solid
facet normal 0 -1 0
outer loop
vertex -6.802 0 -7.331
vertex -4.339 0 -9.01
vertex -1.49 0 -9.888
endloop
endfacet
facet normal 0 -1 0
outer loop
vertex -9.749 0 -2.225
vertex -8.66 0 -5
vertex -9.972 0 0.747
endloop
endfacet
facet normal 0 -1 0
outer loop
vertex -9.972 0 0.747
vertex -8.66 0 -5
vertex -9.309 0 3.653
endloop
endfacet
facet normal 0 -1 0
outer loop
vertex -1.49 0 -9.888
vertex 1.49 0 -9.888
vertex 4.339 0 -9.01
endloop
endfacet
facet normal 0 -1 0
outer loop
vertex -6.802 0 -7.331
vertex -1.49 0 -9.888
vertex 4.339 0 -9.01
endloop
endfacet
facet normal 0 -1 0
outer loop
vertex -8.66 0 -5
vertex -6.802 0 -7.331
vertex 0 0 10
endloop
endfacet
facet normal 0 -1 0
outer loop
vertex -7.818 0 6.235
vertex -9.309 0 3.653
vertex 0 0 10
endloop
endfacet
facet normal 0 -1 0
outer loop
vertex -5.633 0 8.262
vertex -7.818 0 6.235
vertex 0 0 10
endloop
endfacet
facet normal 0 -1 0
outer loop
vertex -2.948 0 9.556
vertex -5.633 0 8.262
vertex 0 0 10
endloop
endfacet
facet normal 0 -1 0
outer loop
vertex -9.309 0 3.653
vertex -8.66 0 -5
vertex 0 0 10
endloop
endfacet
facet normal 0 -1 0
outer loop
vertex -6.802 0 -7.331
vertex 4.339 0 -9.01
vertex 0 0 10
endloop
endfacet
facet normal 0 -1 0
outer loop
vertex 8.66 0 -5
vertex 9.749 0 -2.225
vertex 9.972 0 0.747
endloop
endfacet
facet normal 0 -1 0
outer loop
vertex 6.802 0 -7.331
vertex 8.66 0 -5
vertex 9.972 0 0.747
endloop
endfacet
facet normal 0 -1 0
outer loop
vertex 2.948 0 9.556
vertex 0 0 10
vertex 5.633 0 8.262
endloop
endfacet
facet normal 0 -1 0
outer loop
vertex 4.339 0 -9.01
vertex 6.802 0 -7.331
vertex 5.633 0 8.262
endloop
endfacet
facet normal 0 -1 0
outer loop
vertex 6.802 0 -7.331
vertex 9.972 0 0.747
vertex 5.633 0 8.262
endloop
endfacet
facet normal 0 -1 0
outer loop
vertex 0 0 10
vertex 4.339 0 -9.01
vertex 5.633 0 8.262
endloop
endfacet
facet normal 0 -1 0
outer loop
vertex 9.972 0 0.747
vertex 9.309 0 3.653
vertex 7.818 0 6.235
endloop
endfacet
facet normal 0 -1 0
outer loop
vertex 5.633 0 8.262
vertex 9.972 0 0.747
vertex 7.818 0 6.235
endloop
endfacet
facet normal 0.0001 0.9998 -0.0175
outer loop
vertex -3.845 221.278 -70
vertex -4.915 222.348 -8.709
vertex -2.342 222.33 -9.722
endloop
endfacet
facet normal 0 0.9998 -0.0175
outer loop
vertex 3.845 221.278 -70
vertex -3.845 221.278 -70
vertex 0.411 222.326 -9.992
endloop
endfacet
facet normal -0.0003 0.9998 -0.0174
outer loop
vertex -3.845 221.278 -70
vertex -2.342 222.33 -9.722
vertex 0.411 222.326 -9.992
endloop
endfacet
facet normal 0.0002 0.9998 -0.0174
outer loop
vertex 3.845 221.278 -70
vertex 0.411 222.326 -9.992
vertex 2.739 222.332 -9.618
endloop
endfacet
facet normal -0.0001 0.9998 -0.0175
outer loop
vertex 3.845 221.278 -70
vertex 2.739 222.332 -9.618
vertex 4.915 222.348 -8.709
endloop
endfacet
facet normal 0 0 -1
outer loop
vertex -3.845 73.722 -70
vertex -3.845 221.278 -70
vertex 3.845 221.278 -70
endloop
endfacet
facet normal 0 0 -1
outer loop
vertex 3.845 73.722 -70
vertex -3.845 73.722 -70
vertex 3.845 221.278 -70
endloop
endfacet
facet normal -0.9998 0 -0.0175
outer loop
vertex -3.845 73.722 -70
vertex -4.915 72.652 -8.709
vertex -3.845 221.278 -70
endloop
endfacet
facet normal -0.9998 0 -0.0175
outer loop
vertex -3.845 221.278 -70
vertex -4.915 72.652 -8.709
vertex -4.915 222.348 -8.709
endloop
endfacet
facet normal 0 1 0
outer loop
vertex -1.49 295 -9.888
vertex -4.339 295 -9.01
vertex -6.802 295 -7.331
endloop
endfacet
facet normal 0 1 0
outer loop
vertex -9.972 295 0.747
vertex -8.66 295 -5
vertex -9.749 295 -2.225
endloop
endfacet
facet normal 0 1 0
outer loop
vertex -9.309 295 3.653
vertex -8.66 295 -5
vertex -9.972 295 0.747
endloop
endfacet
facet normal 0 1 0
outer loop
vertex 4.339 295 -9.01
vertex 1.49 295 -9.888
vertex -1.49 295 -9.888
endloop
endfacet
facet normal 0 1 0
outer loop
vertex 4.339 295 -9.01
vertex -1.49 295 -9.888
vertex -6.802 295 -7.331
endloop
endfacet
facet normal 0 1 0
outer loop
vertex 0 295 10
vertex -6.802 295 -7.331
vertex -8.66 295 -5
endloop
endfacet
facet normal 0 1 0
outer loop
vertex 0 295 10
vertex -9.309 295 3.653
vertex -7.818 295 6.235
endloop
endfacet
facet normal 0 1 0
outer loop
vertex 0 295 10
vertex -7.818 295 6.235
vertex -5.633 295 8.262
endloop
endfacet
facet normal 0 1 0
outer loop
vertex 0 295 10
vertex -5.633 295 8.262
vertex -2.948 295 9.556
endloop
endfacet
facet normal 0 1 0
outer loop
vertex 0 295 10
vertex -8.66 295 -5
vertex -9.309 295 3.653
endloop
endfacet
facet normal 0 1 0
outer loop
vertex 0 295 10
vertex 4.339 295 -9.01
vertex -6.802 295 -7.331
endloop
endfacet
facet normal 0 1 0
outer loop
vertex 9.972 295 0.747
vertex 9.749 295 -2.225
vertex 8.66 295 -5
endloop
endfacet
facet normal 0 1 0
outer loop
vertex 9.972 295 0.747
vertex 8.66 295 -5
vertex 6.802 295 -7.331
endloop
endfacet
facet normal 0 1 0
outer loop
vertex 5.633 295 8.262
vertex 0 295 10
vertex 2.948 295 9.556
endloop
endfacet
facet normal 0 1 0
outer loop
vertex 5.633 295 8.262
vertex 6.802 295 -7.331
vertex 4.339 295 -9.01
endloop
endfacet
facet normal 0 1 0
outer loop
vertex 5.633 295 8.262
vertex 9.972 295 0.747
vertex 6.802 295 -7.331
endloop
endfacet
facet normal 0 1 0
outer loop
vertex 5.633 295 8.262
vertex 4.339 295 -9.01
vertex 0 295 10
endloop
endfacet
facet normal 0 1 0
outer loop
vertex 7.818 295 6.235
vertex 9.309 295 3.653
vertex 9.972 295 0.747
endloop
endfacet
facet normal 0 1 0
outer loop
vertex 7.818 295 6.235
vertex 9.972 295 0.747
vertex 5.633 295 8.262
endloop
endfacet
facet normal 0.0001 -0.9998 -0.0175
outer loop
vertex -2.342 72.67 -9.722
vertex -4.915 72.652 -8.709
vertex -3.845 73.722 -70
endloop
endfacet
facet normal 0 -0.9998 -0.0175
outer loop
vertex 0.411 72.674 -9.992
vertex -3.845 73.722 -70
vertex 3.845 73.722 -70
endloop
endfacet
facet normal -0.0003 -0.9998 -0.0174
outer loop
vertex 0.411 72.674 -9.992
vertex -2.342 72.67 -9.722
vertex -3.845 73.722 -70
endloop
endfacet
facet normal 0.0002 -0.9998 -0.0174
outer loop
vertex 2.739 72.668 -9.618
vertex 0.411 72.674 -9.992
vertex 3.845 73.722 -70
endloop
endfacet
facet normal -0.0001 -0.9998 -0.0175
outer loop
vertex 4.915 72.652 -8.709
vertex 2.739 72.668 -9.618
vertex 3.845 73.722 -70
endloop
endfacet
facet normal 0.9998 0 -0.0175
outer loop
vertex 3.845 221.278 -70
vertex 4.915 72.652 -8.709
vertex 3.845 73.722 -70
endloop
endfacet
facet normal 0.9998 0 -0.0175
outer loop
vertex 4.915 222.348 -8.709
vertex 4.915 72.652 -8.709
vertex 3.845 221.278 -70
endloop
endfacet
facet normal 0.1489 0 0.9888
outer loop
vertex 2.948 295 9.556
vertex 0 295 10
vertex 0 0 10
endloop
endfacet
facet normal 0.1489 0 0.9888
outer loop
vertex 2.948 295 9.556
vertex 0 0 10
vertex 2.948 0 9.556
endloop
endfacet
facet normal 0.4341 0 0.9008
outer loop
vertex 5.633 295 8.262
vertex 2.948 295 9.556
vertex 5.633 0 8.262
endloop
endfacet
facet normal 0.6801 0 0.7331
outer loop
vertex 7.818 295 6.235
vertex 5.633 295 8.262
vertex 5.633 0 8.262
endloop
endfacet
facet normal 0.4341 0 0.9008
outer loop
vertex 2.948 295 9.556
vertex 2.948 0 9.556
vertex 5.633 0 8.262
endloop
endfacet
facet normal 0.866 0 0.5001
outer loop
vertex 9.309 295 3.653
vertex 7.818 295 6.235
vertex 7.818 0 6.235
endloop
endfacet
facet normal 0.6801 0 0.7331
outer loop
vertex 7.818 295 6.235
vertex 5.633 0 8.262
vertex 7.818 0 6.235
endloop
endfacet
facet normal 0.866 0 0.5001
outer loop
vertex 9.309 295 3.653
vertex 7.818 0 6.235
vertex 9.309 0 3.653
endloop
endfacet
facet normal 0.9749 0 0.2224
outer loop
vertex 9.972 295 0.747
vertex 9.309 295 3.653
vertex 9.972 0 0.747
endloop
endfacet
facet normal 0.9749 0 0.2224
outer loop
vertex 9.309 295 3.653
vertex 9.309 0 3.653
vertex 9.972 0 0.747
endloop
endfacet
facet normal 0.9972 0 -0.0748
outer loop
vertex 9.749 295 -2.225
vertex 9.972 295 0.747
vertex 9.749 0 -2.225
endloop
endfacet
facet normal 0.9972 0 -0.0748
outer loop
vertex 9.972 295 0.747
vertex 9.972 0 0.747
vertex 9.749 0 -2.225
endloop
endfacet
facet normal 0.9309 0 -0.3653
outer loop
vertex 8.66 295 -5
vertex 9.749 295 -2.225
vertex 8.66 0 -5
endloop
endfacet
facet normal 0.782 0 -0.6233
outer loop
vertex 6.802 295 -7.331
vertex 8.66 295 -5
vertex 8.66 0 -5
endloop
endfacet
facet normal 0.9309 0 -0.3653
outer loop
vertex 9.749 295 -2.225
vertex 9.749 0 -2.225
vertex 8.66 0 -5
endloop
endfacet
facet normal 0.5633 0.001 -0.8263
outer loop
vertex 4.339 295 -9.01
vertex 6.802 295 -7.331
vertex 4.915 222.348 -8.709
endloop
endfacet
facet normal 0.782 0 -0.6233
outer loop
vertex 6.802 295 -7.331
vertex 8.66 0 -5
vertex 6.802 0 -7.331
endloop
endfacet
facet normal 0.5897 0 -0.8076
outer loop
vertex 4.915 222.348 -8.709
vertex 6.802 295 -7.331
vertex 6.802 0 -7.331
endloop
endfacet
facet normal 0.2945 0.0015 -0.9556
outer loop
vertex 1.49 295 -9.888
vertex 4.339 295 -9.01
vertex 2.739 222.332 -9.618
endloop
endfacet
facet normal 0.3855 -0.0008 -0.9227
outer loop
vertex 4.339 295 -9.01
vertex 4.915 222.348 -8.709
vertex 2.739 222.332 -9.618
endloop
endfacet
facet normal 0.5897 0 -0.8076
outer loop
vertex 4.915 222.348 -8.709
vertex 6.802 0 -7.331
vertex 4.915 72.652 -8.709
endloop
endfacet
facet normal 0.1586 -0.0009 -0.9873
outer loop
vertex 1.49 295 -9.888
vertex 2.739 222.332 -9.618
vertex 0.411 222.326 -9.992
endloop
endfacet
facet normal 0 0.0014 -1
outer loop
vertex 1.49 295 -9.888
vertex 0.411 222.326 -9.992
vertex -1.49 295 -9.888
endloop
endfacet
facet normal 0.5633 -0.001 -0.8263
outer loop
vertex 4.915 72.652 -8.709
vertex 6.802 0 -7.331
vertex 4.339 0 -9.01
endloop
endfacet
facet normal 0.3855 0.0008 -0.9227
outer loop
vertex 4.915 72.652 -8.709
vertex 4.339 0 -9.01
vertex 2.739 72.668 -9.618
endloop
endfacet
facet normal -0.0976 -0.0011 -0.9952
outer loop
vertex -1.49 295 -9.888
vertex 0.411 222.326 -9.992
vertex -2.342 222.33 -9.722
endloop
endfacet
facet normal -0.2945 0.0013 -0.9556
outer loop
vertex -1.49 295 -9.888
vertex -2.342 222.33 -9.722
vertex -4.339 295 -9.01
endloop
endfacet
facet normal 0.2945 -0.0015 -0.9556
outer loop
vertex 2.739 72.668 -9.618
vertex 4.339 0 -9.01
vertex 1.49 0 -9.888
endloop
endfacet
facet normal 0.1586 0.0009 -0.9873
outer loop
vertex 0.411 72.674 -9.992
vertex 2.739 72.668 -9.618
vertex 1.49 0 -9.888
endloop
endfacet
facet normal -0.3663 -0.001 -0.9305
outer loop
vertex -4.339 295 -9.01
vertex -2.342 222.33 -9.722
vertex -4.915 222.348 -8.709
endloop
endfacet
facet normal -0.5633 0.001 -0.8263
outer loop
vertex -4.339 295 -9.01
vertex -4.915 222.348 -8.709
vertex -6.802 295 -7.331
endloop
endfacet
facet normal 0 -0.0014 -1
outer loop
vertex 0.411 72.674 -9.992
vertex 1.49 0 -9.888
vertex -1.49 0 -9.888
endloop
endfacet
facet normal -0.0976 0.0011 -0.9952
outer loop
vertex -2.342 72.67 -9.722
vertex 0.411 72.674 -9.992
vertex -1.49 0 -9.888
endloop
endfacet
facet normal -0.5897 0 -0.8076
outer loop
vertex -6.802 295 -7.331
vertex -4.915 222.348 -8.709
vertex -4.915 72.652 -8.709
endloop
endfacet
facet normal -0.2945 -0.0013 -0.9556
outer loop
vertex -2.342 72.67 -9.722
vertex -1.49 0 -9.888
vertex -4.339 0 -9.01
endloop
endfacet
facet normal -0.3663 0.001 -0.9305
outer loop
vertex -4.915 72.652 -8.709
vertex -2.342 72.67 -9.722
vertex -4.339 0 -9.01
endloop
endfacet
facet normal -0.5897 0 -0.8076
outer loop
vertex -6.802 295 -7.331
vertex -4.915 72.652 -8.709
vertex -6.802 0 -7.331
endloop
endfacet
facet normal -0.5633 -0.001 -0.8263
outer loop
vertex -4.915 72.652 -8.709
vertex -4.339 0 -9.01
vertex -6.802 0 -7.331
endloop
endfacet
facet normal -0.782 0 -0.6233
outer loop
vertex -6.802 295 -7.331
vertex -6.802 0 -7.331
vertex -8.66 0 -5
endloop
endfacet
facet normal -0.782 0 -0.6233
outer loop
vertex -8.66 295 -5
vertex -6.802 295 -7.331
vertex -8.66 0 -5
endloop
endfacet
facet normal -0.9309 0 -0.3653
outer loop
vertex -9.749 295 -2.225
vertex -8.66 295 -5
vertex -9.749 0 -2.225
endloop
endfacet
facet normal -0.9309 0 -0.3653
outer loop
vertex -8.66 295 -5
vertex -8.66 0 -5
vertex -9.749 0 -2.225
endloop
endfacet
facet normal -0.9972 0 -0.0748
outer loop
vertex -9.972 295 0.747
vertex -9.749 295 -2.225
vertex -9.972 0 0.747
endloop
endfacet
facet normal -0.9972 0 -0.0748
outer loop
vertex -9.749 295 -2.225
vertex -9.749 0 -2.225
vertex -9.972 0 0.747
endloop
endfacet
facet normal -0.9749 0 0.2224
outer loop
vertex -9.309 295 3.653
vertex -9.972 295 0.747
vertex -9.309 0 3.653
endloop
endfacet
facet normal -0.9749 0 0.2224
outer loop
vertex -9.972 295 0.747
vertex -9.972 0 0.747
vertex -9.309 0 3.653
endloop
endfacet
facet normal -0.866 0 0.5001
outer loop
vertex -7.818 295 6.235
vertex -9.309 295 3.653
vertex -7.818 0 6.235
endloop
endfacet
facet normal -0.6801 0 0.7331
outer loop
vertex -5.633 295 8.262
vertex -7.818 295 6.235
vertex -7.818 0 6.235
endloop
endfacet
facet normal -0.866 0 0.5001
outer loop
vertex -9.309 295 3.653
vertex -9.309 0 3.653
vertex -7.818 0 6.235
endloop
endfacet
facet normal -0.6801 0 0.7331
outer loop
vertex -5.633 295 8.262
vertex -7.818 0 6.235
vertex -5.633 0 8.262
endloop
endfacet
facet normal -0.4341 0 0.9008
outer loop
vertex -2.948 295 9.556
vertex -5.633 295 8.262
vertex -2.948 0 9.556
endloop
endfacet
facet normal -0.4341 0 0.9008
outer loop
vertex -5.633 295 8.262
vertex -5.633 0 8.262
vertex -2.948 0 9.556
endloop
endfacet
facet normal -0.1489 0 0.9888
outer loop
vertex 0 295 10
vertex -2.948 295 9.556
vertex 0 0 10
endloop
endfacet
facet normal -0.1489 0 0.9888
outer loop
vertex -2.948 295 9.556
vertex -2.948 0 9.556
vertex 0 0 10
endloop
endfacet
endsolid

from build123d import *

# Parameters (mm, degrees)
SKIZZE2_R                       = 10
AUFSATZ_LINEAR_AUSTRAGEN1_DEPTH = 295
SKIZZE7_W                       = 10.134043554
SKIZZE7_H                       = 150
AUFSATZ_LINEAR_AUSTRAGEN2_DEPTH = 70
AUFSATZ_LINEAR_AUSTRAGEN2_DRAFT = -1


with BuildPart() as part:
    # Skizze2 → Aufsatz-Linear austragen1 (new body)
    with BuildSketch(Plane(origin=(0, 0, 0), x_dir=(1, 0, 0), z_dir=(0, 1, 0))):
        with Locations(Location((0, 0, 0), (0, 0, 270))):
            Circle(SKIZZE2_R)
    extrude(amount=AUFSATZ_LINEAR_AUSTRAGEN1_DEPTH)


with BuildPart() as aufsatz_linear_austragen2_tool:
    # Skizze7 → Aufsatz-Linear austragen2 (with draft: the straight prism first)
    with BuildSketch(Plane.XY):
        with Locations((0, 147.5)):
            Rectangle(SKIZZE7_W, SKIZZE7_H)
    extrude(amount=-AUFSATZ_LINEAR_AUSTRAGEN2_DEPTH)
    # Aufsatz-Linear austragen2: the draft: its side faces are tilted about the plane it starts from
    aufsatz_linear_austragen2_sides = [aufsatz_linear_austragen2_tool.faces().sort_by_distance(p)[0] for p in [
        (0, 222.5, -35),
        (-5.067021777, 147.5, -35),
        (0, 72.5, -35),
        (5.067021777, 147.5, -35),
    ]]
    draft(aufsatz_linear_austragen2_sides, Plane.XY, AUFSATZ_LINEAR_AUSTRAGEN2_DRAFT)


with BuildPart() as part_1:
    add(part.part)

    # Aufsatz-Linear austragen2: add aufsatz_linear_austragen2_tool
    add(aufsatz_linear_austragen2_tool.part)


solid = part_1.part
